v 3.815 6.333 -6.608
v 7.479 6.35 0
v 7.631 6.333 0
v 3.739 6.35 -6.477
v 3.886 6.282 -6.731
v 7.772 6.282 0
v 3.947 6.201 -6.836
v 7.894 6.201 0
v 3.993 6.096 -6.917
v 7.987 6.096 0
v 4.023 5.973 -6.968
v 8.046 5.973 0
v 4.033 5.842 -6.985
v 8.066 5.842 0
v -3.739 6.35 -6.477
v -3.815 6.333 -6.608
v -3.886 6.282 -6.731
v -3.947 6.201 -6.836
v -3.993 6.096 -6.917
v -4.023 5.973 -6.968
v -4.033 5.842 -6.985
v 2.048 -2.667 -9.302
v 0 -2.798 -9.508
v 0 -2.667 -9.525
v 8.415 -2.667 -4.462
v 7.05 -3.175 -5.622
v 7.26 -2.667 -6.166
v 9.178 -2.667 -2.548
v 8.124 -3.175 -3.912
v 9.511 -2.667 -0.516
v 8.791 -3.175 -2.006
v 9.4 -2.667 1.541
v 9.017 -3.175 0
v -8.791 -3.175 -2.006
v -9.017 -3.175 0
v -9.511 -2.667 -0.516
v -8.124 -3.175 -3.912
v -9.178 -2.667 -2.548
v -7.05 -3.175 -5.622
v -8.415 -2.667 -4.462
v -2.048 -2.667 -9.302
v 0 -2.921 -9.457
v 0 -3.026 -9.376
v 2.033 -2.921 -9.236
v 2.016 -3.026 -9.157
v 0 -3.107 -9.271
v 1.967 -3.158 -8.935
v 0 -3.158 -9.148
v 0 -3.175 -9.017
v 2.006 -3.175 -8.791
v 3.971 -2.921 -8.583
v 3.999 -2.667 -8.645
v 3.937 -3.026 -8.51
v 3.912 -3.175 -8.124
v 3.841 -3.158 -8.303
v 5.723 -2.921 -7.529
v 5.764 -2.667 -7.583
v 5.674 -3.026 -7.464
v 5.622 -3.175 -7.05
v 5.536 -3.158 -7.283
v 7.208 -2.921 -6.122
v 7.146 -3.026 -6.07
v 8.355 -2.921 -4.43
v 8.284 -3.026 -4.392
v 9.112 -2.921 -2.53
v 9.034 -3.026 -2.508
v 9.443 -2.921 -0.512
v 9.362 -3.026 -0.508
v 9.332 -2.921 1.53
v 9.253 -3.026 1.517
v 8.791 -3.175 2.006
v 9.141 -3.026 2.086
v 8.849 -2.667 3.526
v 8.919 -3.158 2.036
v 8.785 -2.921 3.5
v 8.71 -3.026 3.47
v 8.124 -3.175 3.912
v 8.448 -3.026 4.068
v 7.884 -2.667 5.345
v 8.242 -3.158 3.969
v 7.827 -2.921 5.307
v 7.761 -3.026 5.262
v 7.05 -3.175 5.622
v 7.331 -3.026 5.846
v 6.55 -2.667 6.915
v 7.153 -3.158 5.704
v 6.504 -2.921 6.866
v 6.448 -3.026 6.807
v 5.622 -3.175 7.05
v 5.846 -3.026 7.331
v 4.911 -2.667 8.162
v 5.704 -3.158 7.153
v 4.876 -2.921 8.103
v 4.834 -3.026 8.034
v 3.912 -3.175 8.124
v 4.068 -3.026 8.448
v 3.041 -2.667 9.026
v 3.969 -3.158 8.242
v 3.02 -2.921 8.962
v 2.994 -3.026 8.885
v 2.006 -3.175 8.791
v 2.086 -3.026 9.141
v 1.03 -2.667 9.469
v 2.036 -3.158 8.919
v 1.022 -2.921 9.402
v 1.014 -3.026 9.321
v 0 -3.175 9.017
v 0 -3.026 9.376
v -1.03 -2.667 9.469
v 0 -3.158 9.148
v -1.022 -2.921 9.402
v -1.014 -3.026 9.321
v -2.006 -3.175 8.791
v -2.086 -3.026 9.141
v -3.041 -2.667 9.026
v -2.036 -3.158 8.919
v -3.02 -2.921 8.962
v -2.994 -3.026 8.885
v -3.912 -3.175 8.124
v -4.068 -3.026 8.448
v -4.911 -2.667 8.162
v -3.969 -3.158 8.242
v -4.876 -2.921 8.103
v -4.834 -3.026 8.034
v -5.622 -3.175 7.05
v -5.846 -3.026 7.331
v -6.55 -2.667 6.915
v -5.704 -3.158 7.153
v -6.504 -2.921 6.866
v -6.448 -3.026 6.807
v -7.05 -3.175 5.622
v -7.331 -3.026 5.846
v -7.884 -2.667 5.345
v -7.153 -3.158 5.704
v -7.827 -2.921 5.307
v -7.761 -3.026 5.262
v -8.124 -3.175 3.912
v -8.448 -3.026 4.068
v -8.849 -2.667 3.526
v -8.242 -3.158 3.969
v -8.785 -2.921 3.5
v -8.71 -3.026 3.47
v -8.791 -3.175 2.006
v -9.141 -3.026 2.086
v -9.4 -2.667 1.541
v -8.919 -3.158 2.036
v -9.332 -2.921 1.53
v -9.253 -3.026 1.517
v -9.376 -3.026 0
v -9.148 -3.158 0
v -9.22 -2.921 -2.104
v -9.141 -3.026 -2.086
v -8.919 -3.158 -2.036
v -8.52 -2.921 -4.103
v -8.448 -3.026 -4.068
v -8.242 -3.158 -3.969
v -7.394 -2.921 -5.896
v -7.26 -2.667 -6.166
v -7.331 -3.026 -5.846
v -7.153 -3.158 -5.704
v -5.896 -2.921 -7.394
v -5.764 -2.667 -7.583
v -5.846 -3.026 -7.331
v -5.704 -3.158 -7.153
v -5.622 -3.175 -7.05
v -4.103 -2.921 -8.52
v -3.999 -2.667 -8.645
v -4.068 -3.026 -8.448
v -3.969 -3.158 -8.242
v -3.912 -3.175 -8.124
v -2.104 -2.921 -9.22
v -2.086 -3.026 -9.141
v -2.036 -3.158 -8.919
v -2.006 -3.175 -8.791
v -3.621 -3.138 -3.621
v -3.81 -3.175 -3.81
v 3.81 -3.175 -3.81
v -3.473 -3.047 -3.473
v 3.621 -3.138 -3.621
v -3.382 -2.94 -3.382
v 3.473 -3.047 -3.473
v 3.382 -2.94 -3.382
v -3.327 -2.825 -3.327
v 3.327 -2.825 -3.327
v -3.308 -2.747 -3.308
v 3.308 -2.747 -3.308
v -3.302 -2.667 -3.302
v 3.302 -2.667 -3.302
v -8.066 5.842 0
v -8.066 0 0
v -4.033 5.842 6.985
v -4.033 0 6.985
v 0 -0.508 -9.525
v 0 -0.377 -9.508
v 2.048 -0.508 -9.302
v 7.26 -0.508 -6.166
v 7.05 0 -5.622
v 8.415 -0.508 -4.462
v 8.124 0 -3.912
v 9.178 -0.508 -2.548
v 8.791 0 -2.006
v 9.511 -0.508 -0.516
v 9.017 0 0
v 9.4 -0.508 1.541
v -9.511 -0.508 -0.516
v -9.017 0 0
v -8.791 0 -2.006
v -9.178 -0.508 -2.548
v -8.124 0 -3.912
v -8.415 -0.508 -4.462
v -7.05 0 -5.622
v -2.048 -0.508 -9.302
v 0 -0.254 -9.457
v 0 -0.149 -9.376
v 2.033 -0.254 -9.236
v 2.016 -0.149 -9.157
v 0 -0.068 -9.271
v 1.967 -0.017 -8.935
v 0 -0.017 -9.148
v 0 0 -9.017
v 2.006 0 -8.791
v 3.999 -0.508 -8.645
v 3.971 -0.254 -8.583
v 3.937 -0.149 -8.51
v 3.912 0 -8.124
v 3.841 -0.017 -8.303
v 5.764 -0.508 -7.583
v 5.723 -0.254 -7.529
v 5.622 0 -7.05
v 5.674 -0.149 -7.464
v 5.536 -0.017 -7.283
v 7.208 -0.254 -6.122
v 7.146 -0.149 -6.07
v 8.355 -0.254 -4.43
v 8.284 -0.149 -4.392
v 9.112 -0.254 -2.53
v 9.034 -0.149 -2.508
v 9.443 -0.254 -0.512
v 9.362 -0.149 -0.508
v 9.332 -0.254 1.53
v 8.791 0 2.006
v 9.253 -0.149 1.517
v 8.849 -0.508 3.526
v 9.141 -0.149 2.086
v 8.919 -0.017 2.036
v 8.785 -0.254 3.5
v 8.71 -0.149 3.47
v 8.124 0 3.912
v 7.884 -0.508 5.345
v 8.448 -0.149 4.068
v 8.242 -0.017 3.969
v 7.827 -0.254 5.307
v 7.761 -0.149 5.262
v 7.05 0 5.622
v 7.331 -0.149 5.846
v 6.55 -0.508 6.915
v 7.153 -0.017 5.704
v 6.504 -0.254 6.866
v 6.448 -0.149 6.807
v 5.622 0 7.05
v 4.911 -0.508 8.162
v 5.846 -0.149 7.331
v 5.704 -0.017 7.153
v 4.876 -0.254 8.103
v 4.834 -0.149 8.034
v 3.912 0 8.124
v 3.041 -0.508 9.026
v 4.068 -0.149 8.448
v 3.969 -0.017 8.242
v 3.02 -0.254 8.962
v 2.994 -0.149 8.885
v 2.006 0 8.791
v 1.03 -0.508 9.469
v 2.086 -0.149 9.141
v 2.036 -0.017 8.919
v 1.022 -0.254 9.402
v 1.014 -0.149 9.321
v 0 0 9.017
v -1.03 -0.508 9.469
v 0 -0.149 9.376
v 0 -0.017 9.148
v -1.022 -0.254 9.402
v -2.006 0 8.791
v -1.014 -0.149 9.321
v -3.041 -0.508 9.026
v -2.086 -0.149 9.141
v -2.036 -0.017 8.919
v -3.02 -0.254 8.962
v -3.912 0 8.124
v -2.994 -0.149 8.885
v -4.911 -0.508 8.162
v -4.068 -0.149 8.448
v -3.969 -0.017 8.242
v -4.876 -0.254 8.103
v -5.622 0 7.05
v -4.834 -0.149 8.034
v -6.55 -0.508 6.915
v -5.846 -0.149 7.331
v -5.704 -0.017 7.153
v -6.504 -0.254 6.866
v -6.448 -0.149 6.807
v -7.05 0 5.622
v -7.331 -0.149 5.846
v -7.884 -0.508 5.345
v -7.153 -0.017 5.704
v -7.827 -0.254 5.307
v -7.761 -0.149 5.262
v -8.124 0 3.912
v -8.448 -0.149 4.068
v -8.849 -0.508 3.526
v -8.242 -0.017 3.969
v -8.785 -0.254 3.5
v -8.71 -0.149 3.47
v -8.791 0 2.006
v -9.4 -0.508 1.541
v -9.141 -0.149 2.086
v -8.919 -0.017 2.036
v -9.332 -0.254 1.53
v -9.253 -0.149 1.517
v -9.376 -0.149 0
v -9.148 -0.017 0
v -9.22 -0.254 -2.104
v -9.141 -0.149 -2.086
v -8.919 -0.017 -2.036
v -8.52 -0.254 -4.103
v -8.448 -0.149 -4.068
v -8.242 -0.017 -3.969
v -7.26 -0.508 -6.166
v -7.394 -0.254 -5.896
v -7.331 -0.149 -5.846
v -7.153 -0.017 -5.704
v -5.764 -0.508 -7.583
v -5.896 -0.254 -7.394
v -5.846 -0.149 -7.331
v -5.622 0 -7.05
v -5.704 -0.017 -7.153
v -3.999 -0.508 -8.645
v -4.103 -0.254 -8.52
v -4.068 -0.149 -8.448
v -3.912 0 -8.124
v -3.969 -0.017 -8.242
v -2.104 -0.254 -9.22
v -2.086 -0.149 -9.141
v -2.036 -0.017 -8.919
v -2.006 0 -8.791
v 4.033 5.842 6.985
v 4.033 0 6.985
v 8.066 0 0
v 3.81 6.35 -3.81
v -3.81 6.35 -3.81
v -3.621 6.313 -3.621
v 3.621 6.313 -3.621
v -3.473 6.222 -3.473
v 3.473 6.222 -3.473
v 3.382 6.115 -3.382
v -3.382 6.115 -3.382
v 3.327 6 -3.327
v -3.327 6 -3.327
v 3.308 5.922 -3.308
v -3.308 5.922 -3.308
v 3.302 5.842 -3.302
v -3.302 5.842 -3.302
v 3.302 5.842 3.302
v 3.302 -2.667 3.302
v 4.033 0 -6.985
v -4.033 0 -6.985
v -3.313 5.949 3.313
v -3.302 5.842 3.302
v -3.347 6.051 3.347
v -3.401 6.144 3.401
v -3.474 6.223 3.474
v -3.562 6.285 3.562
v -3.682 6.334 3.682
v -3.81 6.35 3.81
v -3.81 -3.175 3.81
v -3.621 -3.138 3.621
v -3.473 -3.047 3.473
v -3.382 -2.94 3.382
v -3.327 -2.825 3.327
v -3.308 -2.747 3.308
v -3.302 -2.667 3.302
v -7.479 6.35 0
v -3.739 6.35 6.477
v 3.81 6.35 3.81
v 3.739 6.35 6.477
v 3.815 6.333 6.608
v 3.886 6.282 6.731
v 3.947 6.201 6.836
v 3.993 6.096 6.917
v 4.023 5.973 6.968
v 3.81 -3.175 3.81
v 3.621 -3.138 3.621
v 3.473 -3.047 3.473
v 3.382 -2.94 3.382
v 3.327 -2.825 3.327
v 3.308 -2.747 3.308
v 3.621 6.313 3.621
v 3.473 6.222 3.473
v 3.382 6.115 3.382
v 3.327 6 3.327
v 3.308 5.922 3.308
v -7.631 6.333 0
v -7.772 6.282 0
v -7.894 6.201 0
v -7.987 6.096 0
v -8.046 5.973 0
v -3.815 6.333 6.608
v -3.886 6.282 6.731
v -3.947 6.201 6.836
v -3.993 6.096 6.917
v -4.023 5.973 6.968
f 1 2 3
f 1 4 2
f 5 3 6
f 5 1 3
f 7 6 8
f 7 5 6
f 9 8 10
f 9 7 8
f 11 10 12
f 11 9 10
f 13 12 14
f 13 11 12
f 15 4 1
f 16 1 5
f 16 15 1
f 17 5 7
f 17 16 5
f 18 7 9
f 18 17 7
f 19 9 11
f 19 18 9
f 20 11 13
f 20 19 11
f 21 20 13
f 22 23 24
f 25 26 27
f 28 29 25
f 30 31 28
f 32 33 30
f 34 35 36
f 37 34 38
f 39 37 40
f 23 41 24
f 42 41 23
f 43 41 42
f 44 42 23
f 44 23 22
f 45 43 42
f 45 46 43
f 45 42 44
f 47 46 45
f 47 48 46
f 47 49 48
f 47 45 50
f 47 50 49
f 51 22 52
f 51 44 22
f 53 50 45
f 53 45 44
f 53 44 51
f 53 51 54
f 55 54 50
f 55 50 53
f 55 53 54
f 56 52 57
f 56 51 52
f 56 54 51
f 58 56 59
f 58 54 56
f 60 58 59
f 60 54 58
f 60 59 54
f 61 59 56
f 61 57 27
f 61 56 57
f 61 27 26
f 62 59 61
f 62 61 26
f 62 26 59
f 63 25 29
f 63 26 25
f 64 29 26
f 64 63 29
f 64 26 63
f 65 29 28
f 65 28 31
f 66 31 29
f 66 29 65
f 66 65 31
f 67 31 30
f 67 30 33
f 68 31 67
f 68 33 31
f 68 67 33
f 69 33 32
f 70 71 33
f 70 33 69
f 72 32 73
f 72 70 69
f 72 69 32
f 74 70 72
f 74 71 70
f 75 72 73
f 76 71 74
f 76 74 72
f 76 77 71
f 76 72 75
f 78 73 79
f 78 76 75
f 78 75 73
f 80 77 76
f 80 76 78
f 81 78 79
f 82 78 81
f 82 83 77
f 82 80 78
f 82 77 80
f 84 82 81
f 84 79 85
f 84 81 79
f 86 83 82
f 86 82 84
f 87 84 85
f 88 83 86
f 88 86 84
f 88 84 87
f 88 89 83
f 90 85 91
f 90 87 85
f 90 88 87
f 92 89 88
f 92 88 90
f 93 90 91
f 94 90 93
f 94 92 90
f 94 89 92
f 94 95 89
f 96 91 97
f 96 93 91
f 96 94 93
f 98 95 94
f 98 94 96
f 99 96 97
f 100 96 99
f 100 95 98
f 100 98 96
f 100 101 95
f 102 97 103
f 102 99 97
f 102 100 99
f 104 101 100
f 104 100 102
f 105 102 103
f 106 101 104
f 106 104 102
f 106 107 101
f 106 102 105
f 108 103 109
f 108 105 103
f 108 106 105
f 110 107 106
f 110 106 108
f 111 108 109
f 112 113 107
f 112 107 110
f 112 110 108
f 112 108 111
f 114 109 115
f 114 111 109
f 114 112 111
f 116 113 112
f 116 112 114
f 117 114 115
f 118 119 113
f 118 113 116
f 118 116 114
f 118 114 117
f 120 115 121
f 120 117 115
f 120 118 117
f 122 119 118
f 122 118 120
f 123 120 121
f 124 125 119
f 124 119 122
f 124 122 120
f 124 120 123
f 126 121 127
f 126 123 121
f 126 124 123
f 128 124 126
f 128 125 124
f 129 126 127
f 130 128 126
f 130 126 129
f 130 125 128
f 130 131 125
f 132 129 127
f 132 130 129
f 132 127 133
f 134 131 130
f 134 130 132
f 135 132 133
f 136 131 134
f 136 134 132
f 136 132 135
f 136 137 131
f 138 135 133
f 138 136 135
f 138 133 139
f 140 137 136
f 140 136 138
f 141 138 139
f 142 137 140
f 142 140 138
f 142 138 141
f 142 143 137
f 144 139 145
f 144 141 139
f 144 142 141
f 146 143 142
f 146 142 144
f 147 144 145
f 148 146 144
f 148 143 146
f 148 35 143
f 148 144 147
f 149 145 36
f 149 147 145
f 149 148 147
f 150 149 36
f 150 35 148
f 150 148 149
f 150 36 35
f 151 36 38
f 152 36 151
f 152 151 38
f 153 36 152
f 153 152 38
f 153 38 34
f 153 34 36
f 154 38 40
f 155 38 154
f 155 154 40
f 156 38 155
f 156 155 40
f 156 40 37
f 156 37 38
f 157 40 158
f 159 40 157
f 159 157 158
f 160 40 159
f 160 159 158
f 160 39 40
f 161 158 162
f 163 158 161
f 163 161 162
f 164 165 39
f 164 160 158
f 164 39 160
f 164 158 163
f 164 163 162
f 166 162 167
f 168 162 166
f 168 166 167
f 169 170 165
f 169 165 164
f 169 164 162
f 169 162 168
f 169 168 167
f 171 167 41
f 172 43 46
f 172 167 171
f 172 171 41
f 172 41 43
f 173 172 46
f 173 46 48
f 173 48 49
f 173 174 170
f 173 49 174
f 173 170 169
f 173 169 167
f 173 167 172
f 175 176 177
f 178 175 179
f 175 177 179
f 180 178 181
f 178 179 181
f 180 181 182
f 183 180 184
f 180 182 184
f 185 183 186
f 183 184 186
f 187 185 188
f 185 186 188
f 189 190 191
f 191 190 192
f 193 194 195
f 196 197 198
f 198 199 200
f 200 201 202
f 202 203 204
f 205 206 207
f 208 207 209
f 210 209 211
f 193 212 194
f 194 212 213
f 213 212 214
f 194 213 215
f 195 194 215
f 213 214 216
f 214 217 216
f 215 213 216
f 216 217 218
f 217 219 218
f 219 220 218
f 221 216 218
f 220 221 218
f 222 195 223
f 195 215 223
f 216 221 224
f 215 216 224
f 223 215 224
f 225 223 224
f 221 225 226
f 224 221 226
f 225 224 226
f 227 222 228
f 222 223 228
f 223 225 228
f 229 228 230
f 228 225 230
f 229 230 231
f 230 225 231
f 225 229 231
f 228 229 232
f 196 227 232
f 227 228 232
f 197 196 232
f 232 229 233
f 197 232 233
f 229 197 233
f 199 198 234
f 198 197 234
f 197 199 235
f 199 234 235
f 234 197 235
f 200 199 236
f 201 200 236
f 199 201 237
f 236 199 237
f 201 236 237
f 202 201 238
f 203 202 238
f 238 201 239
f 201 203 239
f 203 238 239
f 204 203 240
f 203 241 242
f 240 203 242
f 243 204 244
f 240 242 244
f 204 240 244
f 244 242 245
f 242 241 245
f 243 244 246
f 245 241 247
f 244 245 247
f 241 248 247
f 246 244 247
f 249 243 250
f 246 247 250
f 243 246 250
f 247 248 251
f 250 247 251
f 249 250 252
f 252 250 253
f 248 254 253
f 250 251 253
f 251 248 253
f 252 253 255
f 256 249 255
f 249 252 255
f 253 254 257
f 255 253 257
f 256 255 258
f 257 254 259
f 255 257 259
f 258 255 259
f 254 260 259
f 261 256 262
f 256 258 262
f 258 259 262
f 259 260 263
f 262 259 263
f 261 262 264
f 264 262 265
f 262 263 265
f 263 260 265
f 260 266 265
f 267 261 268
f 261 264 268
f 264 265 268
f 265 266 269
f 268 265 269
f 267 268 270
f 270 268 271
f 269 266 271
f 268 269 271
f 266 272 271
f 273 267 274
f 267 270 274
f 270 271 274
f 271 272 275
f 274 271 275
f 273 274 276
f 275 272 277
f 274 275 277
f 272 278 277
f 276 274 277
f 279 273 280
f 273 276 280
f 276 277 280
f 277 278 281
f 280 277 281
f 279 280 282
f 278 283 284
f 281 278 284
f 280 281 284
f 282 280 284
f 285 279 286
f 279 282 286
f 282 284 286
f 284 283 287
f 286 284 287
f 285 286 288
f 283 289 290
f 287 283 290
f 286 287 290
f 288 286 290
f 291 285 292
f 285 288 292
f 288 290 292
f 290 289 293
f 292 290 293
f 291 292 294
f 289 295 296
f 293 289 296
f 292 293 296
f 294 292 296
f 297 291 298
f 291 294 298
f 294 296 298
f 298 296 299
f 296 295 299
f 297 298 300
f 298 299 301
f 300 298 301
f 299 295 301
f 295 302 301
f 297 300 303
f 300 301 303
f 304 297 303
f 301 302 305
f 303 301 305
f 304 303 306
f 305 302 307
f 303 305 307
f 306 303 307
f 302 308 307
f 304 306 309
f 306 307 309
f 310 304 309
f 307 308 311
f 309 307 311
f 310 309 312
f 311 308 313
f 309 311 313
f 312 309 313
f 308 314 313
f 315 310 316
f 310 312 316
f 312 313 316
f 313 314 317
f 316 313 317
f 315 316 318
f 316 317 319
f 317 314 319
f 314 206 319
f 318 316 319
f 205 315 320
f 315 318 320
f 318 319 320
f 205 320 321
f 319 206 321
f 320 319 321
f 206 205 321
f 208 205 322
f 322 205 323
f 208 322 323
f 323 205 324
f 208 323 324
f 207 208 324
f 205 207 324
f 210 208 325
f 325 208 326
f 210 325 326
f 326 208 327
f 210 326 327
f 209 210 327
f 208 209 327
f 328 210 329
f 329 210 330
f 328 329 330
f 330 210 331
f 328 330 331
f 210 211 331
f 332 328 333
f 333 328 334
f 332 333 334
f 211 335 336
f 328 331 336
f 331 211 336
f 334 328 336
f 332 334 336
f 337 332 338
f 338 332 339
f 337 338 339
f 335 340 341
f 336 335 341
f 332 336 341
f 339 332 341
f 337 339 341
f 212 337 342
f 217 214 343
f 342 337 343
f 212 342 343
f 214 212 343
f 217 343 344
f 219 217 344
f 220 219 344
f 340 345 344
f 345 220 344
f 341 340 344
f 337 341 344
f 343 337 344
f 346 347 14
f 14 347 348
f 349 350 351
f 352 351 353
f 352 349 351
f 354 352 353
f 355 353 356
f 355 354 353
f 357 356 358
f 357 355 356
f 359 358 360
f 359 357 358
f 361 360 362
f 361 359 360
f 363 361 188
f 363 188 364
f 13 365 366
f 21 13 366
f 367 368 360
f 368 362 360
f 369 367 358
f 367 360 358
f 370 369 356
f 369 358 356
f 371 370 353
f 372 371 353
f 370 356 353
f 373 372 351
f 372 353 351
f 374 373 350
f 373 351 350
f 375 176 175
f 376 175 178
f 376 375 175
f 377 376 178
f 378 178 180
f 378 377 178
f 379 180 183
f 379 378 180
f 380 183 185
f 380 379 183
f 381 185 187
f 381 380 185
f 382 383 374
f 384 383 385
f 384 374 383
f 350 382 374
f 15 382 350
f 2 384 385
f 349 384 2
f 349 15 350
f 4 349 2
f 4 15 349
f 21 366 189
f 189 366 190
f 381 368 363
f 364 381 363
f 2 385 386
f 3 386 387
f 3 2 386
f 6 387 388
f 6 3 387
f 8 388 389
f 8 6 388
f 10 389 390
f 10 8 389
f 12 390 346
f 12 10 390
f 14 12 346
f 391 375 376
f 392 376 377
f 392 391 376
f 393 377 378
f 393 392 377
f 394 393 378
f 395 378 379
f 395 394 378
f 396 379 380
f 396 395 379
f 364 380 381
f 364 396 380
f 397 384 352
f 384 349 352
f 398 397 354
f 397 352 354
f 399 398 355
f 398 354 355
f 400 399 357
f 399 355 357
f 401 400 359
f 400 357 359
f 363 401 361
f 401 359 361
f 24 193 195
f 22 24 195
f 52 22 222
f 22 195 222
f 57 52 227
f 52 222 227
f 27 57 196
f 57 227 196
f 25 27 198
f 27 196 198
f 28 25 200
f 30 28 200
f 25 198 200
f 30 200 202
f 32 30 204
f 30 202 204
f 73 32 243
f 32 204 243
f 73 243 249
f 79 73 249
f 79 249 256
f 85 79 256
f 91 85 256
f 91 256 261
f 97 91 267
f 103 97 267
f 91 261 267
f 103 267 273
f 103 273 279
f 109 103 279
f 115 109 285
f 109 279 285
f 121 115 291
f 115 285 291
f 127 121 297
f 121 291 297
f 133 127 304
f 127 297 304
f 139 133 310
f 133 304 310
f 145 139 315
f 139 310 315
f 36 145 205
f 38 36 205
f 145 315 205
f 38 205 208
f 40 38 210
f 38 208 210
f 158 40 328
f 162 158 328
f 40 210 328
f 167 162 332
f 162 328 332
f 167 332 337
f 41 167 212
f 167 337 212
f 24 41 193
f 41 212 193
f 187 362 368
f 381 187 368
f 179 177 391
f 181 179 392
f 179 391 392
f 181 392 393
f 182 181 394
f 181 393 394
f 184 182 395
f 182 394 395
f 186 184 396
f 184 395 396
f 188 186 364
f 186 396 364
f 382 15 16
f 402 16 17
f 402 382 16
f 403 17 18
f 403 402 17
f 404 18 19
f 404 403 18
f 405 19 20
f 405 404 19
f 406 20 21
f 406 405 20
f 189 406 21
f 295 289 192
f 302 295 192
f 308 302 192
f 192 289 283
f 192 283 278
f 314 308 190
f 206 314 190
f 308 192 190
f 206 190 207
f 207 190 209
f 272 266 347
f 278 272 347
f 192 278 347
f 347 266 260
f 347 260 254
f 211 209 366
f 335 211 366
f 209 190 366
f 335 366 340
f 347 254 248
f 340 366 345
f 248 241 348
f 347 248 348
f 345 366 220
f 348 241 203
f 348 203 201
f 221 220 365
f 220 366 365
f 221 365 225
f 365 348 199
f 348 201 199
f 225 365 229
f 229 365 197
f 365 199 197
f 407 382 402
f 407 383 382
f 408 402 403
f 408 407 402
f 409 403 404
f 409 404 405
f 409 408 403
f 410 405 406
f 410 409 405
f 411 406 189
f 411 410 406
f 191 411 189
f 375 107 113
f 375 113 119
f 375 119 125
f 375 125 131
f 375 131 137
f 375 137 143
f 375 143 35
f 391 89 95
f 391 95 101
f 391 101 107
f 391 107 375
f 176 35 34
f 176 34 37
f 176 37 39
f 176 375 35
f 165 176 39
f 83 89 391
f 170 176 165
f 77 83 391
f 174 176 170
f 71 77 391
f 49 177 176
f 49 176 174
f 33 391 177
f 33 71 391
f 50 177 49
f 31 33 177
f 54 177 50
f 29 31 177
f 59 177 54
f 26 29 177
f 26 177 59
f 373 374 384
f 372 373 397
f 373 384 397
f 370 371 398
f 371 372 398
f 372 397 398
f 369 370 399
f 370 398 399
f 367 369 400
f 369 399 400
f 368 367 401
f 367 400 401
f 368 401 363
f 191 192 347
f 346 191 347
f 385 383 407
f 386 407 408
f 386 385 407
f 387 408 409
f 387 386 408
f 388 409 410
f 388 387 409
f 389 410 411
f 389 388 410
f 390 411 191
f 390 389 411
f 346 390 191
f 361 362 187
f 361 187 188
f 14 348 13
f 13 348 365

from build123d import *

# Parameters (mm, degrees)
SKETCH1_W           = 6.604
SKETCH1_H           = 6.604
BOSS_EXTRUDE1_DEPTH = 6.35
SKETCH2_R           = 9.525
SKETCH2_W           = 6.604
SKETCH2_H           = 6.604
BOSS_EXTRUDE2_DEPTH = 3.175
FILLET1_R           = 0.508


with BuildPart() as part:
    # Sketch1 → Boss-Extrude1 (new body)
    with BuildSketch(Plane(origin=(0, 0, 0), x_dir=(1, 0, 0), z_dir=(0, 1, 0))):
        Polygon((8.065583261, 0), (4.03279163, 6.985), (-4.03279163, 6.985), (-8.065583261, 0), (-4.03279163, -6.985), (4.03279163, -6.985), align=None)
        Rectangle(SKETCH1_W, SKETCH1_H, mode=Mode.SUBTRACT)
    extrude(amount=BOSS_EXTRUDE1_DEPTH)

    # Sketch2 → Boss-Extrude2 (add)
    with BuildSketch(Plane.XZ):
        with Locations(Location((0, 0, 0), (0, 0, 270))):
            Circle(SKETCH2_R)
        Rectangle(SKETCH2_W, SKETCH2_H, mode=Mode.SUBTRACT)
    extrude(amount=BOSS_EXTRUDE2_DEPTH)

    # Fillet1
    fillet1_edges = [part.edges().sort_by_distance(p)[0] for p in [
        (0, 6.35, -6.985),
        (-6.049187445, 6.35, -3.4925),
        (-6.049187445, 6.35, 3.4925),
        (3.302, 6.35, 0),
        (0, 6.35, -3.302),
        (-3.302, 6.35, 0),
        (0, 6.35, 3.302),
        (0, 6.35, 6.985),
        (0, -3.175, 9.525),
        (0, 0, 9.525),
        (3.302, -3.175, 0),
        (0, -3.175, 3.302),
        (-3.302, -3.175, 0),
        (0, -3.175, -3.302),
        (6.049187445, 6.35, 3.4925),
        (6.049187445, 6.35, -3.4925),
    ]]
    fillet(fillet1_edges, radius=FILLET1_R)


solid = part.part
